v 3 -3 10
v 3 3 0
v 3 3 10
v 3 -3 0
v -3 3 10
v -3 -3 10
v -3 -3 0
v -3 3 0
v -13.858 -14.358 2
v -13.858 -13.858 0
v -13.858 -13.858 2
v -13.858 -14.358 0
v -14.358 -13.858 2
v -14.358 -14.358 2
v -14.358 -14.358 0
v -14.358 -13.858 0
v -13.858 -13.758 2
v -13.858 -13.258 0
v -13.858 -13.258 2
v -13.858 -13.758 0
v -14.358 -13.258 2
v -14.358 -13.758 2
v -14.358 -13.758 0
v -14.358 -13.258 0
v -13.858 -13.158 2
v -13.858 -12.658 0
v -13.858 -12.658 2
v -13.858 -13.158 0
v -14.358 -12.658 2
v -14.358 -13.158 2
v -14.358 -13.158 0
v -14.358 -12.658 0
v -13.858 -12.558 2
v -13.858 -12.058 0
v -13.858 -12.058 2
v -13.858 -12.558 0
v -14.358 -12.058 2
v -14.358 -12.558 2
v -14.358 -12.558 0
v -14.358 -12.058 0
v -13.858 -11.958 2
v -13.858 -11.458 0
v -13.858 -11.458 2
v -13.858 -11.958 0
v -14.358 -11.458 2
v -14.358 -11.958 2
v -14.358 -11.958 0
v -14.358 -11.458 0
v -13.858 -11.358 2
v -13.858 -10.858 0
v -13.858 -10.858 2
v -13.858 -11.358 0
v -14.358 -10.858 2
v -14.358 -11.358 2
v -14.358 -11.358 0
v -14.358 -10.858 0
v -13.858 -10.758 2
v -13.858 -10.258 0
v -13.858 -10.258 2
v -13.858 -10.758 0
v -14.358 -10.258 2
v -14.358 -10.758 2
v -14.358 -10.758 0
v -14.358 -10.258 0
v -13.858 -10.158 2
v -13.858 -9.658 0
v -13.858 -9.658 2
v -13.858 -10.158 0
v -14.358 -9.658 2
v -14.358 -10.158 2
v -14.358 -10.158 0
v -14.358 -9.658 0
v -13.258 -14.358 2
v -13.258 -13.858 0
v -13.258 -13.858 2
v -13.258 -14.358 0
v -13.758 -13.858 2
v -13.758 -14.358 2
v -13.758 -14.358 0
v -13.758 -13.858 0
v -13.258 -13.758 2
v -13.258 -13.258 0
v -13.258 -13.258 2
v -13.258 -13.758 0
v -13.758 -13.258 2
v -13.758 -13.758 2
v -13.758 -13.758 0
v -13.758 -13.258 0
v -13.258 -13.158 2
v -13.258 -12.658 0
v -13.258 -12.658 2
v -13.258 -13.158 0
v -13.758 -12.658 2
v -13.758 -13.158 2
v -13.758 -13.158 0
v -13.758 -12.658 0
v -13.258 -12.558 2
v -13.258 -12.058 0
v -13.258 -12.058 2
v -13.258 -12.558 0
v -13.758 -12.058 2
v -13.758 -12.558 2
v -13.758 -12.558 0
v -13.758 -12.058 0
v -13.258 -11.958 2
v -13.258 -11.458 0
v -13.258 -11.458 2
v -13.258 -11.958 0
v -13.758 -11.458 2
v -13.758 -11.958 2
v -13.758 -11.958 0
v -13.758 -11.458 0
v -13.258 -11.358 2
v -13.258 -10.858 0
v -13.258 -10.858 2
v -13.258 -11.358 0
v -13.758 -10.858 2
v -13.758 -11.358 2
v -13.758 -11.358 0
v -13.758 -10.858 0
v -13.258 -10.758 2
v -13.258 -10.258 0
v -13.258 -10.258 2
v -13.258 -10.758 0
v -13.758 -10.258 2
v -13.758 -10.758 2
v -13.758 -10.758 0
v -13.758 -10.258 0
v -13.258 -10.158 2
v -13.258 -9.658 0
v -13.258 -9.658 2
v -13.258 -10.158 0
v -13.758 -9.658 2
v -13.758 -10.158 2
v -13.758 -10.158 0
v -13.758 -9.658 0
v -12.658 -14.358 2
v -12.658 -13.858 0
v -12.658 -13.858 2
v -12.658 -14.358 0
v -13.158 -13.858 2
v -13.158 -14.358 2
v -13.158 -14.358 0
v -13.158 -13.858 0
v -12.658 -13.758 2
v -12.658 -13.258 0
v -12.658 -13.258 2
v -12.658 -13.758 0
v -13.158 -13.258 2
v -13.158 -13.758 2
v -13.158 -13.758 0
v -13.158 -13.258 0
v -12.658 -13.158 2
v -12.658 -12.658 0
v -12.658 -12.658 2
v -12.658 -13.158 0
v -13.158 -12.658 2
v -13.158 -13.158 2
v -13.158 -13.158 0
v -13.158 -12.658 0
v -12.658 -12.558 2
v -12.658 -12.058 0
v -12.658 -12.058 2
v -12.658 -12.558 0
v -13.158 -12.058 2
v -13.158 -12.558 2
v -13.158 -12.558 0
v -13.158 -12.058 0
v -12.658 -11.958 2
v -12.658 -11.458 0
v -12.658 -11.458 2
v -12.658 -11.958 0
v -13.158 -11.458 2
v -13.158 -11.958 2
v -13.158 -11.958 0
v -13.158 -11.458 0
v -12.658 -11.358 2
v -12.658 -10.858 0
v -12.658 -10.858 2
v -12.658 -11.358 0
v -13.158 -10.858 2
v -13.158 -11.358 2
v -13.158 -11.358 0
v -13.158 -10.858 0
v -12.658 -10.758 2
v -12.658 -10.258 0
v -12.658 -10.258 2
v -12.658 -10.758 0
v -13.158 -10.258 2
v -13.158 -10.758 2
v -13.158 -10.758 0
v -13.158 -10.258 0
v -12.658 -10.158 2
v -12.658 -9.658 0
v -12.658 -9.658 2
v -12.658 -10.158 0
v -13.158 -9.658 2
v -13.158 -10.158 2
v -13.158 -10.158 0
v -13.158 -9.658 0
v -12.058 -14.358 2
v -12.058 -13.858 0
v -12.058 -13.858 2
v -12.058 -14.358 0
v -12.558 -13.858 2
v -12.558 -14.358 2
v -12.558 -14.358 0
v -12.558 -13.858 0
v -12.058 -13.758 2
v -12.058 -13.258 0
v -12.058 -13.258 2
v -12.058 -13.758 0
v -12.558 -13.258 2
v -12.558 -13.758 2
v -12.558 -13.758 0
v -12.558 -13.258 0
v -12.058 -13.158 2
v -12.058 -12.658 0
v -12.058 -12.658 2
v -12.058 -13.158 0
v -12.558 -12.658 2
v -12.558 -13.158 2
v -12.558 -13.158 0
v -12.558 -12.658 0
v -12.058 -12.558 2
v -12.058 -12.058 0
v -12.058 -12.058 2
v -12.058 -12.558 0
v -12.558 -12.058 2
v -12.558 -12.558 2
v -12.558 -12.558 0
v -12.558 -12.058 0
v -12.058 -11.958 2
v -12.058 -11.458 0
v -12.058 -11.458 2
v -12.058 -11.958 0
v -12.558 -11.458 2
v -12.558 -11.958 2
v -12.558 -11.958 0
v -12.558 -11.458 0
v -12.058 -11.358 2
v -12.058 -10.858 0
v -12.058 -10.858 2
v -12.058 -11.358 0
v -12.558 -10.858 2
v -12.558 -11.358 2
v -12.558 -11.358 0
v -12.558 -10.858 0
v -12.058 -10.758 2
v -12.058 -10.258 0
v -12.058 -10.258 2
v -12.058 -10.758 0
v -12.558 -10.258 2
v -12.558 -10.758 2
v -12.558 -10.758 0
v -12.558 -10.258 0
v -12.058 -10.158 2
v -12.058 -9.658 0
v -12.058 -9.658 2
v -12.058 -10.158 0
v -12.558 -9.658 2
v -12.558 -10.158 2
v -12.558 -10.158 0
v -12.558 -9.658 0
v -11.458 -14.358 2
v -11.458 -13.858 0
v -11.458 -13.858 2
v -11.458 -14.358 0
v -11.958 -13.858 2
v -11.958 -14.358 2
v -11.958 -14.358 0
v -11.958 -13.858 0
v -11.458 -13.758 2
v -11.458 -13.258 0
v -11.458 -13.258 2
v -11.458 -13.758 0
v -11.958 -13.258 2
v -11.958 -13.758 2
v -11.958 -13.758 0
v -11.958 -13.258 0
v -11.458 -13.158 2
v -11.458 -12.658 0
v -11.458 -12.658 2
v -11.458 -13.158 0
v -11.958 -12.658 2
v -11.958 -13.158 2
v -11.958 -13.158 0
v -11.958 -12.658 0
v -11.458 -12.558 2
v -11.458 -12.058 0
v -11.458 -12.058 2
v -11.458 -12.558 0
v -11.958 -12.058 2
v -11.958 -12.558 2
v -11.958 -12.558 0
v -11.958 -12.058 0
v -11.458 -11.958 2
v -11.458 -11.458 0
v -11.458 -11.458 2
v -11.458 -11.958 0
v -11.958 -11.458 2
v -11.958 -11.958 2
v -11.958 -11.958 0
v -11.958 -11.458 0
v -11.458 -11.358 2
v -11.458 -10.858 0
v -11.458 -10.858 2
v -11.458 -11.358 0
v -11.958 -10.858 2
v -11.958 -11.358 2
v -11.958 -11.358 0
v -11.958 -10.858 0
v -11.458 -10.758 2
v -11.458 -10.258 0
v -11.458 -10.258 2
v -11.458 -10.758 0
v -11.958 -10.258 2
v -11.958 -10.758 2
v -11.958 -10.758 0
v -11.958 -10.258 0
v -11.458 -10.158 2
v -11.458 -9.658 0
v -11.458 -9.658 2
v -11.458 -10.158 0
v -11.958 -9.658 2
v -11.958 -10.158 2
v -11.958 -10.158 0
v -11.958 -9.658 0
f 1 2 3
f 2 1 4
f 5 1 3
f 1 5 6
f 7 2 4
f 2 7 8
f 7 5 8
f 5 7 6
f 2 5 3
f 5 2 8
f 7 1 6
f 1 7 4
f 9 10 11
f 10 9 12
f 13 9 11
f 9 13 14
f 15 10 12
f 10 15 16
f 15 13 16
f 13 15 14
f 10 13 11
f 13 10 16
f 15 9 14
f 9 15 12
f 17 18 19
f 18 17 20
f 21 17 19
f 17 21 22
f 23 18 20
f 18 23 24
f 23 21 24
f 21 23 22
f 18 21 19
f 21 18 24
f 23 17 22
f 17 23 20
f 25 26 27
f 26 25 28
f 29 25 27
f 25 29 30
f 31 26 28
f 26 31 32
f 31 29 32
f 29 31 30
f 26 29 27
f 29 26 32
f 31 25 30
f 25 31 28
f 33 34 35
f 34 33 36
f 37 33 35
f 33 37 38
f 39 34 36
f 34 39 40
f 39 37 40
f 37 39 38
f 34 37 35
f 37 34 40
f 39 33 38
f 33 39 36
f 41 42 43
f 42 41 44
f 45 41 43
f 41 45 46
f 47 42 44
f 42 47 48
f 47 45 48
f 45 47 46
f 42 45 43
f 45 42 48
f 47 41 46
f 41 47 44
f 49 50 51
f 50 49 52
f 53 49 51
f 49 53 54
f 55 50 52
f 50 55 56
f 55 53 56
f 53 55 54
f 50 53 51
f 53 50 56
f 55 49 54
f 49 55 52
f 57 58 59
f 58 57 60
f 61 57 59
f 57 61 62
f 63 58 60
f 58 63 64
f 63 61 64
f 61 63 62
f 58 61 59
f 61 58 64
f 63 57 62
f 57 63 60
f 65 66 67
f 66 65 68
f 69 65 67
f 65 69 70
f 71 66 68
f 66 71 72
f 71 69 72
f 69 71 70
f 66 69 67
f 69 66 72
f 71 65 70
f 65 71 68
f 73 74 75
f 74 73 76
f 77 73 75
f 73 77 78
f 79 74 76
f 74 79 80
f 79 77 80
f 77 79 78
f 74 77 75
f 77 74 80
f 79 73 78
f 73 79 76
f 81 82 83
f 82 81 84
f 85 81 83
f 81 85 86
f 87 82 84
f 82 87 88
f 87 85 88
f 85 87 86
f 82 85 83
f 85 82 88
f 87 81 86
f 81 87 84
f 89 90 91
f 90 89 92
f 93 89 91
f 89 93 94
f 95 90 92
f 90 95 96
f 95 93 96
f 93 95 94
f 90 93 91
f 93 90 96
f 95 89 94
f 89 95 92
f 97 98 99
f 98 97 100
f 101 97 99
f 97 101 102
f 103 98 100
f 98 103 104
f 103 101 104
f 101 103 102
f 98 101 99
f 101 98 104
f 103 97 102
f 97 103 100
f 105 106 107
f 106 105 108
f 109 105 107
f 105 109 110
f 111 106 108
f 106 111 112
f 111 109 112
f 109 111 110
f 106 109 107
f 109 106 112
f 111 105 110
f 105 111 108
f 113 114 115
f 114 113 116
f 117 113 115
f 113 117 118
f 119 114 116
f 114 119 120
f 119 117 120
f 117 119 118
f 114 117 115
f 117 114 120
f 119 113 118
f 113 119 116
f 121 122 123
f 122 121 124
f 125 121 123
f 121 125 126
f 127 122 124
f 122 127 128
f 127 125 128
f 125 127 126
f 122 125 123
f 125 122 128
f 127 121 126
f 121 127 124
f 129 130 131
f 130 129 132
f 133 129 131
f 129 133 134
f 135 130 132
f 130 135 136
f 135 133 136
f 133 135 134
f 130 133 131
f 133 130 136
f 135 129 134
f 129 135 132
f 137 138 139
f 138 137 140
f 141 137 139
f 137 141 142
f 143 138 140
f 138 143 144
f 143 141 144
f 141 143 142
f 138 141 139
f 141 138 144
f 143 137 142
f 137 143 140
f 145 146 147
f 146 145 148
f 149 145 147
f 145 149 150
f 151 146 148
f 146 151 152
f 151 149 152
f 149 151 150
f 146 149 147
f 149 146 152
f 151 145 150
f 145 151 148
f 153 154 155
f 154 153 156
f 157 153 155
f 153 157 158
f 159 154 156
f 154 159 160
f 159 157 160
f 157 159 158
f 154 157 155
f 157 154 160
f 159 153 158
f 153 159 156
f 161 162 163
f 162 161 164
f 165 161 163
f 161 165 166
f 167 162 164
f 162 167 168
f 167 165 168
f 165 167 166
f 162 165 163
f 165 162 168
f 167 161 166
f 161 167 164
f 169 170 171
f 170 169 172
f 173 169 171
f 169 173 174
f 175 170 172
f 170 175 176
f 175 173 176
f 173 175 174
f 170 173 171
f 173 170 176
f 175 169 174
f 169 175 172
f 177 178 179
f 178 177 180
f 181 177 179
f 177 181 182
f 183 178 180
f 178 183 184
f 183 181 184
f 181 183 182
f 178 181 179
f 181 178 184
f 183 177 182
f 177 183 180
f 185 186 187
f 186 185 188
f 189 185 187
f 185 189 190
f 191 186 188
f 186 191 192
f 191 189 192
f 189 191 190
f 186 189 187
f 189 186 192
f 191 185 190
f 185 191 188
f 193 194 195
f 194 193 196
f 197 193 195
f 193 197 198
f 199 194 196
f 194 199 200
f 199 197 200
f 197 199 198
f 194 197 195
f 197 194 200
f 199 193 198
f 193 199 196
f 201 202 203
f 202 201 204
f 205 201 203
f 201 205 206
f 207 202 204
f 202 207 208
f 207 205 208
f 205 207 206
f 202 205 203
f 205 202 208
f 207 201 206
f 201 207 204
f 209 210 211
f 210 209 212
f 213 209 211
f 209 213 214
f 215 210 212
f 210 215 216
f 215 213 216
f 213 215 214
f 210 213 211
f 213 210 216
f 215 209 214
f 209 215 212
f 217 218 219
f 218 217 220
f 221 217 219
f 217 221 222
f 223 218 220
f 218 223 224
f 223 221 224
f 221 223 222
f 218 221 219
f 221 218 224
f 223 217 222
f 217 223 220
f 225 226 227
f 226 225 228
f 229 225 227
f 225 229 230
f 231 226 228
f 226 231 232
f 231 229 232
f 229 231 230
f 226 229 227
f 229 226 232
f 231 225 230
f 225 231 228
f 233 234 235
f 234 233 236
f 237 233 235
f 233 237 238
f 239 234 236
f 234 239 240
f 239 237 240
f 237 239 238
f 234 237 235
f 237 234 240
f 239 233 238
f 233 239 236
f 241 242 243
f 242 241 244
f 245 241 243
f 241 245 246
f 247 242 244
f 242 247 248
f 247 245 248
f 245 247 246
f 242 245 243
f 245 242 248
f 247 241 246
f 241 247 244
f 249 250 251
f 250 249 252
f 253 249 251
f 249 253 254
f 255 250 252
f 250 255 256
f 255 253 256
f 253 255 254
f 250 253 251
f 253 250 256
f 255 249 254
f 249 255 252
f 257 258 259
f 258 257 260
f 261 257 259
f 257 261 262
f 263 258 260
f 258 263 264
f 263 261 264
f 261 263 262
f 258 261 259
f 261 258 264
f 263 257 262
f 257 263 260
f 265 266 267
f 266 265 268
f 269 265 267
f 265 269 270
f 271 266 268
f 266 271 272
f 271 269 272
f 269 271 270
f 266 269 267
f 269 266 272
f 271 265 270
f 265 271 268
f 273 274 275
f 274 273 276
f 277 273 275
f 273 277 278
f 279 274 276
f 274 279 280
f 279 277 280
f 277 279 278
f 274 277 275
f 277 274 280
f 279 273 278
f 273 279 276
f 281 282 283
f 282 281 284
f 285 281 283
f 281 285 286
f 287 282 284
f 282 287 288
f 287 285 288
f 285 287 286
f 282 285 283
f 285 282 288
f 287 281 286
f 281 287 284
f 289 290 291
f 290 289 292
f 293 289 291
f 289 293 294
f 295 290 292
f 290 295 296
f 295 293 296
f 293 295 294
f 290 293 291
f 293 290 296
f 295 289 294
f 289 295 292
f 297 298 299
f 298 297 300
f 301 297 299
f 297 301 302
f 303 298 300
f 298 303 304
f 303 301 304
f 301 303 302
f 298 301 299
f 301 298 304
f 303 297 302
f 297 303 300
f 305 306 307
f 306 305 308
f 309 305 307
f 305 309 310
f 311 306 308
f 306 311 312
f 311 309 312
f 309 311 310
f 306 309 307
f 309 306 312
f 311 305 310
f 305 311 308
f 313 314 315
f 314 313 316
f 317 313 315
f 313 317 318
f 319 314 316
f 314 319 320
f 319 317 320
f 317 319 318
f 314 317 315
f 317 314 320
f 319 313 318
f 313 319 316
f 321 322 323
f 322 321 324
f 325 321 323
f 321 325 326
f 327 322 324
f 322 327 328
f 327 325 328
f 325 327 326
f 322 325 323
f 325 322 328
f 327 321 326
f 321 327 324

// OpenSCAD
translate([0, 0, 5]) color([0,1,0,0.9]) cube([6, 6, 10], center=true);
translate([-14.108185106778919, -14.108185106778919, 1]) color([1,0,0]) cube([0.5, 0.5, 2], center=true);
translate([-14.108185106778919, -13.50818510677892, 1]) color([1,0,0]) cube([0.5, 0.5, 2], center=true);
translate([-14.108185106778919, -12.90818510677892, 1]) color([1,0,0]) cube([0.5, 0.5, 2], center=true);
translate([-14.108185106778919, -12.30818510677892, 1]) color([1,0,0]) cube([0.5, 0.5, 2], center=true);
translate([-14.108185106778919, -11.70818510677892, 1]) color([1,0,0]) cube([0.5, 0.5, 2], center=true);
translate([-14.108185106778919, -11.108185106778919, 1]) color([1,0,0]) cube([0.5, 0.5, 2], center=true);
translate([-14.108185106778919, -10.50818510677892, 1]) color([1,0,0]) cube([0.5, 0.5, 2], center=true);
translate([-14.108185106778919, -9.90818510677892, 1]) color([1,0,0]) cube([0.5, 0.5, 2], center=true);
translate([-13.50818510677892, -14.108185106778919, 1]) color([1,0,0]) cube([0.5, 0.5, 2], center=true);
translate([-13.50818510677892, -13.50818510677892, 1]) color([1,0,0]) cube([0.5, 0.5, 2], center=true);
translate([-13.50818510677892, -12.90818510677892, 1]) color([1,0,0]) cube([0.5, 0.5, 2], center=true);
translate([-13.50818510677892, -12.30818510677892, 1]) color([1,0,0]) cube([0.5, 0.5, 2], center=true);
translate([-13.50818510677892, -11.70818510677892, 1]) color([1,0,0]) cube([0.5, 0.5, 2], center=true);
translate([-13.50818510677892, -11.108185106778919, 1]) color([1,0,0]) cube([0.5, 0.5, 2], center=true);
translate([-13.50818510677892, -10.50818510677892, 1]) color([1,0,0]) cube([0.5, 0.5, 2], center=true);
translate([-13.50818510677892, -9.90818510677892, 1]) color([1,0,0]) cube([0.5, 0.5, 2], center=true);
translate([-12.90818510677892, -14.108185106778919, 1]) color([1,0,0]) cube([0.5, 0.5, 2], center=true);
translate([-12.90818510677892, -13.50818510677892, 1]) color([1,0,0]) cube([0.5, 0.5, 2], center=true);
translate([-12.90818510677892, -12.90818510677892, 1]) color([1,0,0]) cube([0.5, 0.5, 2], center=true);
translate([-12.90818510677892, -12.30818510677892, 1]) color([1,0,0]) cube([0.5, 0.5, 2], center=true);
translate([-12.90818510677892, -11.70818510677892, 1]) color([1,0,0]) cube([0.5, 0.5, 2], center=true);
translate([-12.90818510677892, -11.108185106778919, 1]) color([1,0,0]) cube([0.5, 0.5, 2], center=true);
translate([-12.90818510677892, -10.50818510677892, 1]) color([1,0,0]) cube([0.5, 0.5, 2], center=true);
translate([-12.90818510677892, -9.90818510677892, 1]) color([1,0,0]) cube([0.5, 0.5, 2], center=true);
translate([-12.30818510677892, -14.108185106778919, 1]) color([1,0,0]) cube([0.5, 0.5, 2], center=true);
translate([-12.30818510677892, -13.50818510677892, 1]) color([1,0,0]) cube([0.5, 0.5, 2], center=true);
translate([-12.30818510677892, -12.90818510677892, 1]) color([1,0,0]) cube([0.5, 0.5, 2], center=true);
translate([-12.30818510677892, -12.30818510677892, 1]) color([1,0,0]) cube([0.5, 0.5, 2], center=true);
translate([-12.30818510677892, -11.70818510677892, 1]) color([1,0,0]) cube([0.5, 0.5, 2], center=true);
translate([-12.30818510677892, -11.108185106778919, 1]) color([1,0,0]) cube([0.5, 0.5, 2], center=true);
translate([-12.30818510677892, -10.50818510677892, 1]) color([1,0,0]) cube([0.5, 0.5, 2], center=true);
translate([-12.30818510677892, -9.90818510677892, 1]) color([1,0,0]) cube([0.5, 0.5, 2], center=true);
translate([-11.70818510677892, -14.108185106778919, 1]) color([1,0,0]) cube([0.5, 0.5, 2], center=true);
translate([-11.70818510677892, -13.50818510677892, 1]) color([1,0,0]) cube([0.5, 0.5, 2], center=true);
translate([-11.70818510677892, -12.90818510677892, 1]) color([1,0,0]) cube([0.5, 0.5, 2], center=true);
translate([-11.70818510677892, -12.30818510677892, 1]) color([1,0,0]) cube([0.5, 0.5, 2], center=true);
translate([-11.70818510677892, -11.70818510677892, 1]) color([1,0,0]) cube([0.5, 0.5, 2], center=true);
translate([-11.70818510677892, -11.108185106778919, 1]) color([1,0,0]) cube([0.5, 0.5, 2], center=true);
translate([-11.70818510677892, -10.50818510677892, 1]) color([1,0,0]) cube([0.5, 0.5, 2], center=true);
translate([-11.70818510677892, -9.90818510677892, 1]) color([1,0,0]) cube([0.5, 0.5, 2], center=true);
